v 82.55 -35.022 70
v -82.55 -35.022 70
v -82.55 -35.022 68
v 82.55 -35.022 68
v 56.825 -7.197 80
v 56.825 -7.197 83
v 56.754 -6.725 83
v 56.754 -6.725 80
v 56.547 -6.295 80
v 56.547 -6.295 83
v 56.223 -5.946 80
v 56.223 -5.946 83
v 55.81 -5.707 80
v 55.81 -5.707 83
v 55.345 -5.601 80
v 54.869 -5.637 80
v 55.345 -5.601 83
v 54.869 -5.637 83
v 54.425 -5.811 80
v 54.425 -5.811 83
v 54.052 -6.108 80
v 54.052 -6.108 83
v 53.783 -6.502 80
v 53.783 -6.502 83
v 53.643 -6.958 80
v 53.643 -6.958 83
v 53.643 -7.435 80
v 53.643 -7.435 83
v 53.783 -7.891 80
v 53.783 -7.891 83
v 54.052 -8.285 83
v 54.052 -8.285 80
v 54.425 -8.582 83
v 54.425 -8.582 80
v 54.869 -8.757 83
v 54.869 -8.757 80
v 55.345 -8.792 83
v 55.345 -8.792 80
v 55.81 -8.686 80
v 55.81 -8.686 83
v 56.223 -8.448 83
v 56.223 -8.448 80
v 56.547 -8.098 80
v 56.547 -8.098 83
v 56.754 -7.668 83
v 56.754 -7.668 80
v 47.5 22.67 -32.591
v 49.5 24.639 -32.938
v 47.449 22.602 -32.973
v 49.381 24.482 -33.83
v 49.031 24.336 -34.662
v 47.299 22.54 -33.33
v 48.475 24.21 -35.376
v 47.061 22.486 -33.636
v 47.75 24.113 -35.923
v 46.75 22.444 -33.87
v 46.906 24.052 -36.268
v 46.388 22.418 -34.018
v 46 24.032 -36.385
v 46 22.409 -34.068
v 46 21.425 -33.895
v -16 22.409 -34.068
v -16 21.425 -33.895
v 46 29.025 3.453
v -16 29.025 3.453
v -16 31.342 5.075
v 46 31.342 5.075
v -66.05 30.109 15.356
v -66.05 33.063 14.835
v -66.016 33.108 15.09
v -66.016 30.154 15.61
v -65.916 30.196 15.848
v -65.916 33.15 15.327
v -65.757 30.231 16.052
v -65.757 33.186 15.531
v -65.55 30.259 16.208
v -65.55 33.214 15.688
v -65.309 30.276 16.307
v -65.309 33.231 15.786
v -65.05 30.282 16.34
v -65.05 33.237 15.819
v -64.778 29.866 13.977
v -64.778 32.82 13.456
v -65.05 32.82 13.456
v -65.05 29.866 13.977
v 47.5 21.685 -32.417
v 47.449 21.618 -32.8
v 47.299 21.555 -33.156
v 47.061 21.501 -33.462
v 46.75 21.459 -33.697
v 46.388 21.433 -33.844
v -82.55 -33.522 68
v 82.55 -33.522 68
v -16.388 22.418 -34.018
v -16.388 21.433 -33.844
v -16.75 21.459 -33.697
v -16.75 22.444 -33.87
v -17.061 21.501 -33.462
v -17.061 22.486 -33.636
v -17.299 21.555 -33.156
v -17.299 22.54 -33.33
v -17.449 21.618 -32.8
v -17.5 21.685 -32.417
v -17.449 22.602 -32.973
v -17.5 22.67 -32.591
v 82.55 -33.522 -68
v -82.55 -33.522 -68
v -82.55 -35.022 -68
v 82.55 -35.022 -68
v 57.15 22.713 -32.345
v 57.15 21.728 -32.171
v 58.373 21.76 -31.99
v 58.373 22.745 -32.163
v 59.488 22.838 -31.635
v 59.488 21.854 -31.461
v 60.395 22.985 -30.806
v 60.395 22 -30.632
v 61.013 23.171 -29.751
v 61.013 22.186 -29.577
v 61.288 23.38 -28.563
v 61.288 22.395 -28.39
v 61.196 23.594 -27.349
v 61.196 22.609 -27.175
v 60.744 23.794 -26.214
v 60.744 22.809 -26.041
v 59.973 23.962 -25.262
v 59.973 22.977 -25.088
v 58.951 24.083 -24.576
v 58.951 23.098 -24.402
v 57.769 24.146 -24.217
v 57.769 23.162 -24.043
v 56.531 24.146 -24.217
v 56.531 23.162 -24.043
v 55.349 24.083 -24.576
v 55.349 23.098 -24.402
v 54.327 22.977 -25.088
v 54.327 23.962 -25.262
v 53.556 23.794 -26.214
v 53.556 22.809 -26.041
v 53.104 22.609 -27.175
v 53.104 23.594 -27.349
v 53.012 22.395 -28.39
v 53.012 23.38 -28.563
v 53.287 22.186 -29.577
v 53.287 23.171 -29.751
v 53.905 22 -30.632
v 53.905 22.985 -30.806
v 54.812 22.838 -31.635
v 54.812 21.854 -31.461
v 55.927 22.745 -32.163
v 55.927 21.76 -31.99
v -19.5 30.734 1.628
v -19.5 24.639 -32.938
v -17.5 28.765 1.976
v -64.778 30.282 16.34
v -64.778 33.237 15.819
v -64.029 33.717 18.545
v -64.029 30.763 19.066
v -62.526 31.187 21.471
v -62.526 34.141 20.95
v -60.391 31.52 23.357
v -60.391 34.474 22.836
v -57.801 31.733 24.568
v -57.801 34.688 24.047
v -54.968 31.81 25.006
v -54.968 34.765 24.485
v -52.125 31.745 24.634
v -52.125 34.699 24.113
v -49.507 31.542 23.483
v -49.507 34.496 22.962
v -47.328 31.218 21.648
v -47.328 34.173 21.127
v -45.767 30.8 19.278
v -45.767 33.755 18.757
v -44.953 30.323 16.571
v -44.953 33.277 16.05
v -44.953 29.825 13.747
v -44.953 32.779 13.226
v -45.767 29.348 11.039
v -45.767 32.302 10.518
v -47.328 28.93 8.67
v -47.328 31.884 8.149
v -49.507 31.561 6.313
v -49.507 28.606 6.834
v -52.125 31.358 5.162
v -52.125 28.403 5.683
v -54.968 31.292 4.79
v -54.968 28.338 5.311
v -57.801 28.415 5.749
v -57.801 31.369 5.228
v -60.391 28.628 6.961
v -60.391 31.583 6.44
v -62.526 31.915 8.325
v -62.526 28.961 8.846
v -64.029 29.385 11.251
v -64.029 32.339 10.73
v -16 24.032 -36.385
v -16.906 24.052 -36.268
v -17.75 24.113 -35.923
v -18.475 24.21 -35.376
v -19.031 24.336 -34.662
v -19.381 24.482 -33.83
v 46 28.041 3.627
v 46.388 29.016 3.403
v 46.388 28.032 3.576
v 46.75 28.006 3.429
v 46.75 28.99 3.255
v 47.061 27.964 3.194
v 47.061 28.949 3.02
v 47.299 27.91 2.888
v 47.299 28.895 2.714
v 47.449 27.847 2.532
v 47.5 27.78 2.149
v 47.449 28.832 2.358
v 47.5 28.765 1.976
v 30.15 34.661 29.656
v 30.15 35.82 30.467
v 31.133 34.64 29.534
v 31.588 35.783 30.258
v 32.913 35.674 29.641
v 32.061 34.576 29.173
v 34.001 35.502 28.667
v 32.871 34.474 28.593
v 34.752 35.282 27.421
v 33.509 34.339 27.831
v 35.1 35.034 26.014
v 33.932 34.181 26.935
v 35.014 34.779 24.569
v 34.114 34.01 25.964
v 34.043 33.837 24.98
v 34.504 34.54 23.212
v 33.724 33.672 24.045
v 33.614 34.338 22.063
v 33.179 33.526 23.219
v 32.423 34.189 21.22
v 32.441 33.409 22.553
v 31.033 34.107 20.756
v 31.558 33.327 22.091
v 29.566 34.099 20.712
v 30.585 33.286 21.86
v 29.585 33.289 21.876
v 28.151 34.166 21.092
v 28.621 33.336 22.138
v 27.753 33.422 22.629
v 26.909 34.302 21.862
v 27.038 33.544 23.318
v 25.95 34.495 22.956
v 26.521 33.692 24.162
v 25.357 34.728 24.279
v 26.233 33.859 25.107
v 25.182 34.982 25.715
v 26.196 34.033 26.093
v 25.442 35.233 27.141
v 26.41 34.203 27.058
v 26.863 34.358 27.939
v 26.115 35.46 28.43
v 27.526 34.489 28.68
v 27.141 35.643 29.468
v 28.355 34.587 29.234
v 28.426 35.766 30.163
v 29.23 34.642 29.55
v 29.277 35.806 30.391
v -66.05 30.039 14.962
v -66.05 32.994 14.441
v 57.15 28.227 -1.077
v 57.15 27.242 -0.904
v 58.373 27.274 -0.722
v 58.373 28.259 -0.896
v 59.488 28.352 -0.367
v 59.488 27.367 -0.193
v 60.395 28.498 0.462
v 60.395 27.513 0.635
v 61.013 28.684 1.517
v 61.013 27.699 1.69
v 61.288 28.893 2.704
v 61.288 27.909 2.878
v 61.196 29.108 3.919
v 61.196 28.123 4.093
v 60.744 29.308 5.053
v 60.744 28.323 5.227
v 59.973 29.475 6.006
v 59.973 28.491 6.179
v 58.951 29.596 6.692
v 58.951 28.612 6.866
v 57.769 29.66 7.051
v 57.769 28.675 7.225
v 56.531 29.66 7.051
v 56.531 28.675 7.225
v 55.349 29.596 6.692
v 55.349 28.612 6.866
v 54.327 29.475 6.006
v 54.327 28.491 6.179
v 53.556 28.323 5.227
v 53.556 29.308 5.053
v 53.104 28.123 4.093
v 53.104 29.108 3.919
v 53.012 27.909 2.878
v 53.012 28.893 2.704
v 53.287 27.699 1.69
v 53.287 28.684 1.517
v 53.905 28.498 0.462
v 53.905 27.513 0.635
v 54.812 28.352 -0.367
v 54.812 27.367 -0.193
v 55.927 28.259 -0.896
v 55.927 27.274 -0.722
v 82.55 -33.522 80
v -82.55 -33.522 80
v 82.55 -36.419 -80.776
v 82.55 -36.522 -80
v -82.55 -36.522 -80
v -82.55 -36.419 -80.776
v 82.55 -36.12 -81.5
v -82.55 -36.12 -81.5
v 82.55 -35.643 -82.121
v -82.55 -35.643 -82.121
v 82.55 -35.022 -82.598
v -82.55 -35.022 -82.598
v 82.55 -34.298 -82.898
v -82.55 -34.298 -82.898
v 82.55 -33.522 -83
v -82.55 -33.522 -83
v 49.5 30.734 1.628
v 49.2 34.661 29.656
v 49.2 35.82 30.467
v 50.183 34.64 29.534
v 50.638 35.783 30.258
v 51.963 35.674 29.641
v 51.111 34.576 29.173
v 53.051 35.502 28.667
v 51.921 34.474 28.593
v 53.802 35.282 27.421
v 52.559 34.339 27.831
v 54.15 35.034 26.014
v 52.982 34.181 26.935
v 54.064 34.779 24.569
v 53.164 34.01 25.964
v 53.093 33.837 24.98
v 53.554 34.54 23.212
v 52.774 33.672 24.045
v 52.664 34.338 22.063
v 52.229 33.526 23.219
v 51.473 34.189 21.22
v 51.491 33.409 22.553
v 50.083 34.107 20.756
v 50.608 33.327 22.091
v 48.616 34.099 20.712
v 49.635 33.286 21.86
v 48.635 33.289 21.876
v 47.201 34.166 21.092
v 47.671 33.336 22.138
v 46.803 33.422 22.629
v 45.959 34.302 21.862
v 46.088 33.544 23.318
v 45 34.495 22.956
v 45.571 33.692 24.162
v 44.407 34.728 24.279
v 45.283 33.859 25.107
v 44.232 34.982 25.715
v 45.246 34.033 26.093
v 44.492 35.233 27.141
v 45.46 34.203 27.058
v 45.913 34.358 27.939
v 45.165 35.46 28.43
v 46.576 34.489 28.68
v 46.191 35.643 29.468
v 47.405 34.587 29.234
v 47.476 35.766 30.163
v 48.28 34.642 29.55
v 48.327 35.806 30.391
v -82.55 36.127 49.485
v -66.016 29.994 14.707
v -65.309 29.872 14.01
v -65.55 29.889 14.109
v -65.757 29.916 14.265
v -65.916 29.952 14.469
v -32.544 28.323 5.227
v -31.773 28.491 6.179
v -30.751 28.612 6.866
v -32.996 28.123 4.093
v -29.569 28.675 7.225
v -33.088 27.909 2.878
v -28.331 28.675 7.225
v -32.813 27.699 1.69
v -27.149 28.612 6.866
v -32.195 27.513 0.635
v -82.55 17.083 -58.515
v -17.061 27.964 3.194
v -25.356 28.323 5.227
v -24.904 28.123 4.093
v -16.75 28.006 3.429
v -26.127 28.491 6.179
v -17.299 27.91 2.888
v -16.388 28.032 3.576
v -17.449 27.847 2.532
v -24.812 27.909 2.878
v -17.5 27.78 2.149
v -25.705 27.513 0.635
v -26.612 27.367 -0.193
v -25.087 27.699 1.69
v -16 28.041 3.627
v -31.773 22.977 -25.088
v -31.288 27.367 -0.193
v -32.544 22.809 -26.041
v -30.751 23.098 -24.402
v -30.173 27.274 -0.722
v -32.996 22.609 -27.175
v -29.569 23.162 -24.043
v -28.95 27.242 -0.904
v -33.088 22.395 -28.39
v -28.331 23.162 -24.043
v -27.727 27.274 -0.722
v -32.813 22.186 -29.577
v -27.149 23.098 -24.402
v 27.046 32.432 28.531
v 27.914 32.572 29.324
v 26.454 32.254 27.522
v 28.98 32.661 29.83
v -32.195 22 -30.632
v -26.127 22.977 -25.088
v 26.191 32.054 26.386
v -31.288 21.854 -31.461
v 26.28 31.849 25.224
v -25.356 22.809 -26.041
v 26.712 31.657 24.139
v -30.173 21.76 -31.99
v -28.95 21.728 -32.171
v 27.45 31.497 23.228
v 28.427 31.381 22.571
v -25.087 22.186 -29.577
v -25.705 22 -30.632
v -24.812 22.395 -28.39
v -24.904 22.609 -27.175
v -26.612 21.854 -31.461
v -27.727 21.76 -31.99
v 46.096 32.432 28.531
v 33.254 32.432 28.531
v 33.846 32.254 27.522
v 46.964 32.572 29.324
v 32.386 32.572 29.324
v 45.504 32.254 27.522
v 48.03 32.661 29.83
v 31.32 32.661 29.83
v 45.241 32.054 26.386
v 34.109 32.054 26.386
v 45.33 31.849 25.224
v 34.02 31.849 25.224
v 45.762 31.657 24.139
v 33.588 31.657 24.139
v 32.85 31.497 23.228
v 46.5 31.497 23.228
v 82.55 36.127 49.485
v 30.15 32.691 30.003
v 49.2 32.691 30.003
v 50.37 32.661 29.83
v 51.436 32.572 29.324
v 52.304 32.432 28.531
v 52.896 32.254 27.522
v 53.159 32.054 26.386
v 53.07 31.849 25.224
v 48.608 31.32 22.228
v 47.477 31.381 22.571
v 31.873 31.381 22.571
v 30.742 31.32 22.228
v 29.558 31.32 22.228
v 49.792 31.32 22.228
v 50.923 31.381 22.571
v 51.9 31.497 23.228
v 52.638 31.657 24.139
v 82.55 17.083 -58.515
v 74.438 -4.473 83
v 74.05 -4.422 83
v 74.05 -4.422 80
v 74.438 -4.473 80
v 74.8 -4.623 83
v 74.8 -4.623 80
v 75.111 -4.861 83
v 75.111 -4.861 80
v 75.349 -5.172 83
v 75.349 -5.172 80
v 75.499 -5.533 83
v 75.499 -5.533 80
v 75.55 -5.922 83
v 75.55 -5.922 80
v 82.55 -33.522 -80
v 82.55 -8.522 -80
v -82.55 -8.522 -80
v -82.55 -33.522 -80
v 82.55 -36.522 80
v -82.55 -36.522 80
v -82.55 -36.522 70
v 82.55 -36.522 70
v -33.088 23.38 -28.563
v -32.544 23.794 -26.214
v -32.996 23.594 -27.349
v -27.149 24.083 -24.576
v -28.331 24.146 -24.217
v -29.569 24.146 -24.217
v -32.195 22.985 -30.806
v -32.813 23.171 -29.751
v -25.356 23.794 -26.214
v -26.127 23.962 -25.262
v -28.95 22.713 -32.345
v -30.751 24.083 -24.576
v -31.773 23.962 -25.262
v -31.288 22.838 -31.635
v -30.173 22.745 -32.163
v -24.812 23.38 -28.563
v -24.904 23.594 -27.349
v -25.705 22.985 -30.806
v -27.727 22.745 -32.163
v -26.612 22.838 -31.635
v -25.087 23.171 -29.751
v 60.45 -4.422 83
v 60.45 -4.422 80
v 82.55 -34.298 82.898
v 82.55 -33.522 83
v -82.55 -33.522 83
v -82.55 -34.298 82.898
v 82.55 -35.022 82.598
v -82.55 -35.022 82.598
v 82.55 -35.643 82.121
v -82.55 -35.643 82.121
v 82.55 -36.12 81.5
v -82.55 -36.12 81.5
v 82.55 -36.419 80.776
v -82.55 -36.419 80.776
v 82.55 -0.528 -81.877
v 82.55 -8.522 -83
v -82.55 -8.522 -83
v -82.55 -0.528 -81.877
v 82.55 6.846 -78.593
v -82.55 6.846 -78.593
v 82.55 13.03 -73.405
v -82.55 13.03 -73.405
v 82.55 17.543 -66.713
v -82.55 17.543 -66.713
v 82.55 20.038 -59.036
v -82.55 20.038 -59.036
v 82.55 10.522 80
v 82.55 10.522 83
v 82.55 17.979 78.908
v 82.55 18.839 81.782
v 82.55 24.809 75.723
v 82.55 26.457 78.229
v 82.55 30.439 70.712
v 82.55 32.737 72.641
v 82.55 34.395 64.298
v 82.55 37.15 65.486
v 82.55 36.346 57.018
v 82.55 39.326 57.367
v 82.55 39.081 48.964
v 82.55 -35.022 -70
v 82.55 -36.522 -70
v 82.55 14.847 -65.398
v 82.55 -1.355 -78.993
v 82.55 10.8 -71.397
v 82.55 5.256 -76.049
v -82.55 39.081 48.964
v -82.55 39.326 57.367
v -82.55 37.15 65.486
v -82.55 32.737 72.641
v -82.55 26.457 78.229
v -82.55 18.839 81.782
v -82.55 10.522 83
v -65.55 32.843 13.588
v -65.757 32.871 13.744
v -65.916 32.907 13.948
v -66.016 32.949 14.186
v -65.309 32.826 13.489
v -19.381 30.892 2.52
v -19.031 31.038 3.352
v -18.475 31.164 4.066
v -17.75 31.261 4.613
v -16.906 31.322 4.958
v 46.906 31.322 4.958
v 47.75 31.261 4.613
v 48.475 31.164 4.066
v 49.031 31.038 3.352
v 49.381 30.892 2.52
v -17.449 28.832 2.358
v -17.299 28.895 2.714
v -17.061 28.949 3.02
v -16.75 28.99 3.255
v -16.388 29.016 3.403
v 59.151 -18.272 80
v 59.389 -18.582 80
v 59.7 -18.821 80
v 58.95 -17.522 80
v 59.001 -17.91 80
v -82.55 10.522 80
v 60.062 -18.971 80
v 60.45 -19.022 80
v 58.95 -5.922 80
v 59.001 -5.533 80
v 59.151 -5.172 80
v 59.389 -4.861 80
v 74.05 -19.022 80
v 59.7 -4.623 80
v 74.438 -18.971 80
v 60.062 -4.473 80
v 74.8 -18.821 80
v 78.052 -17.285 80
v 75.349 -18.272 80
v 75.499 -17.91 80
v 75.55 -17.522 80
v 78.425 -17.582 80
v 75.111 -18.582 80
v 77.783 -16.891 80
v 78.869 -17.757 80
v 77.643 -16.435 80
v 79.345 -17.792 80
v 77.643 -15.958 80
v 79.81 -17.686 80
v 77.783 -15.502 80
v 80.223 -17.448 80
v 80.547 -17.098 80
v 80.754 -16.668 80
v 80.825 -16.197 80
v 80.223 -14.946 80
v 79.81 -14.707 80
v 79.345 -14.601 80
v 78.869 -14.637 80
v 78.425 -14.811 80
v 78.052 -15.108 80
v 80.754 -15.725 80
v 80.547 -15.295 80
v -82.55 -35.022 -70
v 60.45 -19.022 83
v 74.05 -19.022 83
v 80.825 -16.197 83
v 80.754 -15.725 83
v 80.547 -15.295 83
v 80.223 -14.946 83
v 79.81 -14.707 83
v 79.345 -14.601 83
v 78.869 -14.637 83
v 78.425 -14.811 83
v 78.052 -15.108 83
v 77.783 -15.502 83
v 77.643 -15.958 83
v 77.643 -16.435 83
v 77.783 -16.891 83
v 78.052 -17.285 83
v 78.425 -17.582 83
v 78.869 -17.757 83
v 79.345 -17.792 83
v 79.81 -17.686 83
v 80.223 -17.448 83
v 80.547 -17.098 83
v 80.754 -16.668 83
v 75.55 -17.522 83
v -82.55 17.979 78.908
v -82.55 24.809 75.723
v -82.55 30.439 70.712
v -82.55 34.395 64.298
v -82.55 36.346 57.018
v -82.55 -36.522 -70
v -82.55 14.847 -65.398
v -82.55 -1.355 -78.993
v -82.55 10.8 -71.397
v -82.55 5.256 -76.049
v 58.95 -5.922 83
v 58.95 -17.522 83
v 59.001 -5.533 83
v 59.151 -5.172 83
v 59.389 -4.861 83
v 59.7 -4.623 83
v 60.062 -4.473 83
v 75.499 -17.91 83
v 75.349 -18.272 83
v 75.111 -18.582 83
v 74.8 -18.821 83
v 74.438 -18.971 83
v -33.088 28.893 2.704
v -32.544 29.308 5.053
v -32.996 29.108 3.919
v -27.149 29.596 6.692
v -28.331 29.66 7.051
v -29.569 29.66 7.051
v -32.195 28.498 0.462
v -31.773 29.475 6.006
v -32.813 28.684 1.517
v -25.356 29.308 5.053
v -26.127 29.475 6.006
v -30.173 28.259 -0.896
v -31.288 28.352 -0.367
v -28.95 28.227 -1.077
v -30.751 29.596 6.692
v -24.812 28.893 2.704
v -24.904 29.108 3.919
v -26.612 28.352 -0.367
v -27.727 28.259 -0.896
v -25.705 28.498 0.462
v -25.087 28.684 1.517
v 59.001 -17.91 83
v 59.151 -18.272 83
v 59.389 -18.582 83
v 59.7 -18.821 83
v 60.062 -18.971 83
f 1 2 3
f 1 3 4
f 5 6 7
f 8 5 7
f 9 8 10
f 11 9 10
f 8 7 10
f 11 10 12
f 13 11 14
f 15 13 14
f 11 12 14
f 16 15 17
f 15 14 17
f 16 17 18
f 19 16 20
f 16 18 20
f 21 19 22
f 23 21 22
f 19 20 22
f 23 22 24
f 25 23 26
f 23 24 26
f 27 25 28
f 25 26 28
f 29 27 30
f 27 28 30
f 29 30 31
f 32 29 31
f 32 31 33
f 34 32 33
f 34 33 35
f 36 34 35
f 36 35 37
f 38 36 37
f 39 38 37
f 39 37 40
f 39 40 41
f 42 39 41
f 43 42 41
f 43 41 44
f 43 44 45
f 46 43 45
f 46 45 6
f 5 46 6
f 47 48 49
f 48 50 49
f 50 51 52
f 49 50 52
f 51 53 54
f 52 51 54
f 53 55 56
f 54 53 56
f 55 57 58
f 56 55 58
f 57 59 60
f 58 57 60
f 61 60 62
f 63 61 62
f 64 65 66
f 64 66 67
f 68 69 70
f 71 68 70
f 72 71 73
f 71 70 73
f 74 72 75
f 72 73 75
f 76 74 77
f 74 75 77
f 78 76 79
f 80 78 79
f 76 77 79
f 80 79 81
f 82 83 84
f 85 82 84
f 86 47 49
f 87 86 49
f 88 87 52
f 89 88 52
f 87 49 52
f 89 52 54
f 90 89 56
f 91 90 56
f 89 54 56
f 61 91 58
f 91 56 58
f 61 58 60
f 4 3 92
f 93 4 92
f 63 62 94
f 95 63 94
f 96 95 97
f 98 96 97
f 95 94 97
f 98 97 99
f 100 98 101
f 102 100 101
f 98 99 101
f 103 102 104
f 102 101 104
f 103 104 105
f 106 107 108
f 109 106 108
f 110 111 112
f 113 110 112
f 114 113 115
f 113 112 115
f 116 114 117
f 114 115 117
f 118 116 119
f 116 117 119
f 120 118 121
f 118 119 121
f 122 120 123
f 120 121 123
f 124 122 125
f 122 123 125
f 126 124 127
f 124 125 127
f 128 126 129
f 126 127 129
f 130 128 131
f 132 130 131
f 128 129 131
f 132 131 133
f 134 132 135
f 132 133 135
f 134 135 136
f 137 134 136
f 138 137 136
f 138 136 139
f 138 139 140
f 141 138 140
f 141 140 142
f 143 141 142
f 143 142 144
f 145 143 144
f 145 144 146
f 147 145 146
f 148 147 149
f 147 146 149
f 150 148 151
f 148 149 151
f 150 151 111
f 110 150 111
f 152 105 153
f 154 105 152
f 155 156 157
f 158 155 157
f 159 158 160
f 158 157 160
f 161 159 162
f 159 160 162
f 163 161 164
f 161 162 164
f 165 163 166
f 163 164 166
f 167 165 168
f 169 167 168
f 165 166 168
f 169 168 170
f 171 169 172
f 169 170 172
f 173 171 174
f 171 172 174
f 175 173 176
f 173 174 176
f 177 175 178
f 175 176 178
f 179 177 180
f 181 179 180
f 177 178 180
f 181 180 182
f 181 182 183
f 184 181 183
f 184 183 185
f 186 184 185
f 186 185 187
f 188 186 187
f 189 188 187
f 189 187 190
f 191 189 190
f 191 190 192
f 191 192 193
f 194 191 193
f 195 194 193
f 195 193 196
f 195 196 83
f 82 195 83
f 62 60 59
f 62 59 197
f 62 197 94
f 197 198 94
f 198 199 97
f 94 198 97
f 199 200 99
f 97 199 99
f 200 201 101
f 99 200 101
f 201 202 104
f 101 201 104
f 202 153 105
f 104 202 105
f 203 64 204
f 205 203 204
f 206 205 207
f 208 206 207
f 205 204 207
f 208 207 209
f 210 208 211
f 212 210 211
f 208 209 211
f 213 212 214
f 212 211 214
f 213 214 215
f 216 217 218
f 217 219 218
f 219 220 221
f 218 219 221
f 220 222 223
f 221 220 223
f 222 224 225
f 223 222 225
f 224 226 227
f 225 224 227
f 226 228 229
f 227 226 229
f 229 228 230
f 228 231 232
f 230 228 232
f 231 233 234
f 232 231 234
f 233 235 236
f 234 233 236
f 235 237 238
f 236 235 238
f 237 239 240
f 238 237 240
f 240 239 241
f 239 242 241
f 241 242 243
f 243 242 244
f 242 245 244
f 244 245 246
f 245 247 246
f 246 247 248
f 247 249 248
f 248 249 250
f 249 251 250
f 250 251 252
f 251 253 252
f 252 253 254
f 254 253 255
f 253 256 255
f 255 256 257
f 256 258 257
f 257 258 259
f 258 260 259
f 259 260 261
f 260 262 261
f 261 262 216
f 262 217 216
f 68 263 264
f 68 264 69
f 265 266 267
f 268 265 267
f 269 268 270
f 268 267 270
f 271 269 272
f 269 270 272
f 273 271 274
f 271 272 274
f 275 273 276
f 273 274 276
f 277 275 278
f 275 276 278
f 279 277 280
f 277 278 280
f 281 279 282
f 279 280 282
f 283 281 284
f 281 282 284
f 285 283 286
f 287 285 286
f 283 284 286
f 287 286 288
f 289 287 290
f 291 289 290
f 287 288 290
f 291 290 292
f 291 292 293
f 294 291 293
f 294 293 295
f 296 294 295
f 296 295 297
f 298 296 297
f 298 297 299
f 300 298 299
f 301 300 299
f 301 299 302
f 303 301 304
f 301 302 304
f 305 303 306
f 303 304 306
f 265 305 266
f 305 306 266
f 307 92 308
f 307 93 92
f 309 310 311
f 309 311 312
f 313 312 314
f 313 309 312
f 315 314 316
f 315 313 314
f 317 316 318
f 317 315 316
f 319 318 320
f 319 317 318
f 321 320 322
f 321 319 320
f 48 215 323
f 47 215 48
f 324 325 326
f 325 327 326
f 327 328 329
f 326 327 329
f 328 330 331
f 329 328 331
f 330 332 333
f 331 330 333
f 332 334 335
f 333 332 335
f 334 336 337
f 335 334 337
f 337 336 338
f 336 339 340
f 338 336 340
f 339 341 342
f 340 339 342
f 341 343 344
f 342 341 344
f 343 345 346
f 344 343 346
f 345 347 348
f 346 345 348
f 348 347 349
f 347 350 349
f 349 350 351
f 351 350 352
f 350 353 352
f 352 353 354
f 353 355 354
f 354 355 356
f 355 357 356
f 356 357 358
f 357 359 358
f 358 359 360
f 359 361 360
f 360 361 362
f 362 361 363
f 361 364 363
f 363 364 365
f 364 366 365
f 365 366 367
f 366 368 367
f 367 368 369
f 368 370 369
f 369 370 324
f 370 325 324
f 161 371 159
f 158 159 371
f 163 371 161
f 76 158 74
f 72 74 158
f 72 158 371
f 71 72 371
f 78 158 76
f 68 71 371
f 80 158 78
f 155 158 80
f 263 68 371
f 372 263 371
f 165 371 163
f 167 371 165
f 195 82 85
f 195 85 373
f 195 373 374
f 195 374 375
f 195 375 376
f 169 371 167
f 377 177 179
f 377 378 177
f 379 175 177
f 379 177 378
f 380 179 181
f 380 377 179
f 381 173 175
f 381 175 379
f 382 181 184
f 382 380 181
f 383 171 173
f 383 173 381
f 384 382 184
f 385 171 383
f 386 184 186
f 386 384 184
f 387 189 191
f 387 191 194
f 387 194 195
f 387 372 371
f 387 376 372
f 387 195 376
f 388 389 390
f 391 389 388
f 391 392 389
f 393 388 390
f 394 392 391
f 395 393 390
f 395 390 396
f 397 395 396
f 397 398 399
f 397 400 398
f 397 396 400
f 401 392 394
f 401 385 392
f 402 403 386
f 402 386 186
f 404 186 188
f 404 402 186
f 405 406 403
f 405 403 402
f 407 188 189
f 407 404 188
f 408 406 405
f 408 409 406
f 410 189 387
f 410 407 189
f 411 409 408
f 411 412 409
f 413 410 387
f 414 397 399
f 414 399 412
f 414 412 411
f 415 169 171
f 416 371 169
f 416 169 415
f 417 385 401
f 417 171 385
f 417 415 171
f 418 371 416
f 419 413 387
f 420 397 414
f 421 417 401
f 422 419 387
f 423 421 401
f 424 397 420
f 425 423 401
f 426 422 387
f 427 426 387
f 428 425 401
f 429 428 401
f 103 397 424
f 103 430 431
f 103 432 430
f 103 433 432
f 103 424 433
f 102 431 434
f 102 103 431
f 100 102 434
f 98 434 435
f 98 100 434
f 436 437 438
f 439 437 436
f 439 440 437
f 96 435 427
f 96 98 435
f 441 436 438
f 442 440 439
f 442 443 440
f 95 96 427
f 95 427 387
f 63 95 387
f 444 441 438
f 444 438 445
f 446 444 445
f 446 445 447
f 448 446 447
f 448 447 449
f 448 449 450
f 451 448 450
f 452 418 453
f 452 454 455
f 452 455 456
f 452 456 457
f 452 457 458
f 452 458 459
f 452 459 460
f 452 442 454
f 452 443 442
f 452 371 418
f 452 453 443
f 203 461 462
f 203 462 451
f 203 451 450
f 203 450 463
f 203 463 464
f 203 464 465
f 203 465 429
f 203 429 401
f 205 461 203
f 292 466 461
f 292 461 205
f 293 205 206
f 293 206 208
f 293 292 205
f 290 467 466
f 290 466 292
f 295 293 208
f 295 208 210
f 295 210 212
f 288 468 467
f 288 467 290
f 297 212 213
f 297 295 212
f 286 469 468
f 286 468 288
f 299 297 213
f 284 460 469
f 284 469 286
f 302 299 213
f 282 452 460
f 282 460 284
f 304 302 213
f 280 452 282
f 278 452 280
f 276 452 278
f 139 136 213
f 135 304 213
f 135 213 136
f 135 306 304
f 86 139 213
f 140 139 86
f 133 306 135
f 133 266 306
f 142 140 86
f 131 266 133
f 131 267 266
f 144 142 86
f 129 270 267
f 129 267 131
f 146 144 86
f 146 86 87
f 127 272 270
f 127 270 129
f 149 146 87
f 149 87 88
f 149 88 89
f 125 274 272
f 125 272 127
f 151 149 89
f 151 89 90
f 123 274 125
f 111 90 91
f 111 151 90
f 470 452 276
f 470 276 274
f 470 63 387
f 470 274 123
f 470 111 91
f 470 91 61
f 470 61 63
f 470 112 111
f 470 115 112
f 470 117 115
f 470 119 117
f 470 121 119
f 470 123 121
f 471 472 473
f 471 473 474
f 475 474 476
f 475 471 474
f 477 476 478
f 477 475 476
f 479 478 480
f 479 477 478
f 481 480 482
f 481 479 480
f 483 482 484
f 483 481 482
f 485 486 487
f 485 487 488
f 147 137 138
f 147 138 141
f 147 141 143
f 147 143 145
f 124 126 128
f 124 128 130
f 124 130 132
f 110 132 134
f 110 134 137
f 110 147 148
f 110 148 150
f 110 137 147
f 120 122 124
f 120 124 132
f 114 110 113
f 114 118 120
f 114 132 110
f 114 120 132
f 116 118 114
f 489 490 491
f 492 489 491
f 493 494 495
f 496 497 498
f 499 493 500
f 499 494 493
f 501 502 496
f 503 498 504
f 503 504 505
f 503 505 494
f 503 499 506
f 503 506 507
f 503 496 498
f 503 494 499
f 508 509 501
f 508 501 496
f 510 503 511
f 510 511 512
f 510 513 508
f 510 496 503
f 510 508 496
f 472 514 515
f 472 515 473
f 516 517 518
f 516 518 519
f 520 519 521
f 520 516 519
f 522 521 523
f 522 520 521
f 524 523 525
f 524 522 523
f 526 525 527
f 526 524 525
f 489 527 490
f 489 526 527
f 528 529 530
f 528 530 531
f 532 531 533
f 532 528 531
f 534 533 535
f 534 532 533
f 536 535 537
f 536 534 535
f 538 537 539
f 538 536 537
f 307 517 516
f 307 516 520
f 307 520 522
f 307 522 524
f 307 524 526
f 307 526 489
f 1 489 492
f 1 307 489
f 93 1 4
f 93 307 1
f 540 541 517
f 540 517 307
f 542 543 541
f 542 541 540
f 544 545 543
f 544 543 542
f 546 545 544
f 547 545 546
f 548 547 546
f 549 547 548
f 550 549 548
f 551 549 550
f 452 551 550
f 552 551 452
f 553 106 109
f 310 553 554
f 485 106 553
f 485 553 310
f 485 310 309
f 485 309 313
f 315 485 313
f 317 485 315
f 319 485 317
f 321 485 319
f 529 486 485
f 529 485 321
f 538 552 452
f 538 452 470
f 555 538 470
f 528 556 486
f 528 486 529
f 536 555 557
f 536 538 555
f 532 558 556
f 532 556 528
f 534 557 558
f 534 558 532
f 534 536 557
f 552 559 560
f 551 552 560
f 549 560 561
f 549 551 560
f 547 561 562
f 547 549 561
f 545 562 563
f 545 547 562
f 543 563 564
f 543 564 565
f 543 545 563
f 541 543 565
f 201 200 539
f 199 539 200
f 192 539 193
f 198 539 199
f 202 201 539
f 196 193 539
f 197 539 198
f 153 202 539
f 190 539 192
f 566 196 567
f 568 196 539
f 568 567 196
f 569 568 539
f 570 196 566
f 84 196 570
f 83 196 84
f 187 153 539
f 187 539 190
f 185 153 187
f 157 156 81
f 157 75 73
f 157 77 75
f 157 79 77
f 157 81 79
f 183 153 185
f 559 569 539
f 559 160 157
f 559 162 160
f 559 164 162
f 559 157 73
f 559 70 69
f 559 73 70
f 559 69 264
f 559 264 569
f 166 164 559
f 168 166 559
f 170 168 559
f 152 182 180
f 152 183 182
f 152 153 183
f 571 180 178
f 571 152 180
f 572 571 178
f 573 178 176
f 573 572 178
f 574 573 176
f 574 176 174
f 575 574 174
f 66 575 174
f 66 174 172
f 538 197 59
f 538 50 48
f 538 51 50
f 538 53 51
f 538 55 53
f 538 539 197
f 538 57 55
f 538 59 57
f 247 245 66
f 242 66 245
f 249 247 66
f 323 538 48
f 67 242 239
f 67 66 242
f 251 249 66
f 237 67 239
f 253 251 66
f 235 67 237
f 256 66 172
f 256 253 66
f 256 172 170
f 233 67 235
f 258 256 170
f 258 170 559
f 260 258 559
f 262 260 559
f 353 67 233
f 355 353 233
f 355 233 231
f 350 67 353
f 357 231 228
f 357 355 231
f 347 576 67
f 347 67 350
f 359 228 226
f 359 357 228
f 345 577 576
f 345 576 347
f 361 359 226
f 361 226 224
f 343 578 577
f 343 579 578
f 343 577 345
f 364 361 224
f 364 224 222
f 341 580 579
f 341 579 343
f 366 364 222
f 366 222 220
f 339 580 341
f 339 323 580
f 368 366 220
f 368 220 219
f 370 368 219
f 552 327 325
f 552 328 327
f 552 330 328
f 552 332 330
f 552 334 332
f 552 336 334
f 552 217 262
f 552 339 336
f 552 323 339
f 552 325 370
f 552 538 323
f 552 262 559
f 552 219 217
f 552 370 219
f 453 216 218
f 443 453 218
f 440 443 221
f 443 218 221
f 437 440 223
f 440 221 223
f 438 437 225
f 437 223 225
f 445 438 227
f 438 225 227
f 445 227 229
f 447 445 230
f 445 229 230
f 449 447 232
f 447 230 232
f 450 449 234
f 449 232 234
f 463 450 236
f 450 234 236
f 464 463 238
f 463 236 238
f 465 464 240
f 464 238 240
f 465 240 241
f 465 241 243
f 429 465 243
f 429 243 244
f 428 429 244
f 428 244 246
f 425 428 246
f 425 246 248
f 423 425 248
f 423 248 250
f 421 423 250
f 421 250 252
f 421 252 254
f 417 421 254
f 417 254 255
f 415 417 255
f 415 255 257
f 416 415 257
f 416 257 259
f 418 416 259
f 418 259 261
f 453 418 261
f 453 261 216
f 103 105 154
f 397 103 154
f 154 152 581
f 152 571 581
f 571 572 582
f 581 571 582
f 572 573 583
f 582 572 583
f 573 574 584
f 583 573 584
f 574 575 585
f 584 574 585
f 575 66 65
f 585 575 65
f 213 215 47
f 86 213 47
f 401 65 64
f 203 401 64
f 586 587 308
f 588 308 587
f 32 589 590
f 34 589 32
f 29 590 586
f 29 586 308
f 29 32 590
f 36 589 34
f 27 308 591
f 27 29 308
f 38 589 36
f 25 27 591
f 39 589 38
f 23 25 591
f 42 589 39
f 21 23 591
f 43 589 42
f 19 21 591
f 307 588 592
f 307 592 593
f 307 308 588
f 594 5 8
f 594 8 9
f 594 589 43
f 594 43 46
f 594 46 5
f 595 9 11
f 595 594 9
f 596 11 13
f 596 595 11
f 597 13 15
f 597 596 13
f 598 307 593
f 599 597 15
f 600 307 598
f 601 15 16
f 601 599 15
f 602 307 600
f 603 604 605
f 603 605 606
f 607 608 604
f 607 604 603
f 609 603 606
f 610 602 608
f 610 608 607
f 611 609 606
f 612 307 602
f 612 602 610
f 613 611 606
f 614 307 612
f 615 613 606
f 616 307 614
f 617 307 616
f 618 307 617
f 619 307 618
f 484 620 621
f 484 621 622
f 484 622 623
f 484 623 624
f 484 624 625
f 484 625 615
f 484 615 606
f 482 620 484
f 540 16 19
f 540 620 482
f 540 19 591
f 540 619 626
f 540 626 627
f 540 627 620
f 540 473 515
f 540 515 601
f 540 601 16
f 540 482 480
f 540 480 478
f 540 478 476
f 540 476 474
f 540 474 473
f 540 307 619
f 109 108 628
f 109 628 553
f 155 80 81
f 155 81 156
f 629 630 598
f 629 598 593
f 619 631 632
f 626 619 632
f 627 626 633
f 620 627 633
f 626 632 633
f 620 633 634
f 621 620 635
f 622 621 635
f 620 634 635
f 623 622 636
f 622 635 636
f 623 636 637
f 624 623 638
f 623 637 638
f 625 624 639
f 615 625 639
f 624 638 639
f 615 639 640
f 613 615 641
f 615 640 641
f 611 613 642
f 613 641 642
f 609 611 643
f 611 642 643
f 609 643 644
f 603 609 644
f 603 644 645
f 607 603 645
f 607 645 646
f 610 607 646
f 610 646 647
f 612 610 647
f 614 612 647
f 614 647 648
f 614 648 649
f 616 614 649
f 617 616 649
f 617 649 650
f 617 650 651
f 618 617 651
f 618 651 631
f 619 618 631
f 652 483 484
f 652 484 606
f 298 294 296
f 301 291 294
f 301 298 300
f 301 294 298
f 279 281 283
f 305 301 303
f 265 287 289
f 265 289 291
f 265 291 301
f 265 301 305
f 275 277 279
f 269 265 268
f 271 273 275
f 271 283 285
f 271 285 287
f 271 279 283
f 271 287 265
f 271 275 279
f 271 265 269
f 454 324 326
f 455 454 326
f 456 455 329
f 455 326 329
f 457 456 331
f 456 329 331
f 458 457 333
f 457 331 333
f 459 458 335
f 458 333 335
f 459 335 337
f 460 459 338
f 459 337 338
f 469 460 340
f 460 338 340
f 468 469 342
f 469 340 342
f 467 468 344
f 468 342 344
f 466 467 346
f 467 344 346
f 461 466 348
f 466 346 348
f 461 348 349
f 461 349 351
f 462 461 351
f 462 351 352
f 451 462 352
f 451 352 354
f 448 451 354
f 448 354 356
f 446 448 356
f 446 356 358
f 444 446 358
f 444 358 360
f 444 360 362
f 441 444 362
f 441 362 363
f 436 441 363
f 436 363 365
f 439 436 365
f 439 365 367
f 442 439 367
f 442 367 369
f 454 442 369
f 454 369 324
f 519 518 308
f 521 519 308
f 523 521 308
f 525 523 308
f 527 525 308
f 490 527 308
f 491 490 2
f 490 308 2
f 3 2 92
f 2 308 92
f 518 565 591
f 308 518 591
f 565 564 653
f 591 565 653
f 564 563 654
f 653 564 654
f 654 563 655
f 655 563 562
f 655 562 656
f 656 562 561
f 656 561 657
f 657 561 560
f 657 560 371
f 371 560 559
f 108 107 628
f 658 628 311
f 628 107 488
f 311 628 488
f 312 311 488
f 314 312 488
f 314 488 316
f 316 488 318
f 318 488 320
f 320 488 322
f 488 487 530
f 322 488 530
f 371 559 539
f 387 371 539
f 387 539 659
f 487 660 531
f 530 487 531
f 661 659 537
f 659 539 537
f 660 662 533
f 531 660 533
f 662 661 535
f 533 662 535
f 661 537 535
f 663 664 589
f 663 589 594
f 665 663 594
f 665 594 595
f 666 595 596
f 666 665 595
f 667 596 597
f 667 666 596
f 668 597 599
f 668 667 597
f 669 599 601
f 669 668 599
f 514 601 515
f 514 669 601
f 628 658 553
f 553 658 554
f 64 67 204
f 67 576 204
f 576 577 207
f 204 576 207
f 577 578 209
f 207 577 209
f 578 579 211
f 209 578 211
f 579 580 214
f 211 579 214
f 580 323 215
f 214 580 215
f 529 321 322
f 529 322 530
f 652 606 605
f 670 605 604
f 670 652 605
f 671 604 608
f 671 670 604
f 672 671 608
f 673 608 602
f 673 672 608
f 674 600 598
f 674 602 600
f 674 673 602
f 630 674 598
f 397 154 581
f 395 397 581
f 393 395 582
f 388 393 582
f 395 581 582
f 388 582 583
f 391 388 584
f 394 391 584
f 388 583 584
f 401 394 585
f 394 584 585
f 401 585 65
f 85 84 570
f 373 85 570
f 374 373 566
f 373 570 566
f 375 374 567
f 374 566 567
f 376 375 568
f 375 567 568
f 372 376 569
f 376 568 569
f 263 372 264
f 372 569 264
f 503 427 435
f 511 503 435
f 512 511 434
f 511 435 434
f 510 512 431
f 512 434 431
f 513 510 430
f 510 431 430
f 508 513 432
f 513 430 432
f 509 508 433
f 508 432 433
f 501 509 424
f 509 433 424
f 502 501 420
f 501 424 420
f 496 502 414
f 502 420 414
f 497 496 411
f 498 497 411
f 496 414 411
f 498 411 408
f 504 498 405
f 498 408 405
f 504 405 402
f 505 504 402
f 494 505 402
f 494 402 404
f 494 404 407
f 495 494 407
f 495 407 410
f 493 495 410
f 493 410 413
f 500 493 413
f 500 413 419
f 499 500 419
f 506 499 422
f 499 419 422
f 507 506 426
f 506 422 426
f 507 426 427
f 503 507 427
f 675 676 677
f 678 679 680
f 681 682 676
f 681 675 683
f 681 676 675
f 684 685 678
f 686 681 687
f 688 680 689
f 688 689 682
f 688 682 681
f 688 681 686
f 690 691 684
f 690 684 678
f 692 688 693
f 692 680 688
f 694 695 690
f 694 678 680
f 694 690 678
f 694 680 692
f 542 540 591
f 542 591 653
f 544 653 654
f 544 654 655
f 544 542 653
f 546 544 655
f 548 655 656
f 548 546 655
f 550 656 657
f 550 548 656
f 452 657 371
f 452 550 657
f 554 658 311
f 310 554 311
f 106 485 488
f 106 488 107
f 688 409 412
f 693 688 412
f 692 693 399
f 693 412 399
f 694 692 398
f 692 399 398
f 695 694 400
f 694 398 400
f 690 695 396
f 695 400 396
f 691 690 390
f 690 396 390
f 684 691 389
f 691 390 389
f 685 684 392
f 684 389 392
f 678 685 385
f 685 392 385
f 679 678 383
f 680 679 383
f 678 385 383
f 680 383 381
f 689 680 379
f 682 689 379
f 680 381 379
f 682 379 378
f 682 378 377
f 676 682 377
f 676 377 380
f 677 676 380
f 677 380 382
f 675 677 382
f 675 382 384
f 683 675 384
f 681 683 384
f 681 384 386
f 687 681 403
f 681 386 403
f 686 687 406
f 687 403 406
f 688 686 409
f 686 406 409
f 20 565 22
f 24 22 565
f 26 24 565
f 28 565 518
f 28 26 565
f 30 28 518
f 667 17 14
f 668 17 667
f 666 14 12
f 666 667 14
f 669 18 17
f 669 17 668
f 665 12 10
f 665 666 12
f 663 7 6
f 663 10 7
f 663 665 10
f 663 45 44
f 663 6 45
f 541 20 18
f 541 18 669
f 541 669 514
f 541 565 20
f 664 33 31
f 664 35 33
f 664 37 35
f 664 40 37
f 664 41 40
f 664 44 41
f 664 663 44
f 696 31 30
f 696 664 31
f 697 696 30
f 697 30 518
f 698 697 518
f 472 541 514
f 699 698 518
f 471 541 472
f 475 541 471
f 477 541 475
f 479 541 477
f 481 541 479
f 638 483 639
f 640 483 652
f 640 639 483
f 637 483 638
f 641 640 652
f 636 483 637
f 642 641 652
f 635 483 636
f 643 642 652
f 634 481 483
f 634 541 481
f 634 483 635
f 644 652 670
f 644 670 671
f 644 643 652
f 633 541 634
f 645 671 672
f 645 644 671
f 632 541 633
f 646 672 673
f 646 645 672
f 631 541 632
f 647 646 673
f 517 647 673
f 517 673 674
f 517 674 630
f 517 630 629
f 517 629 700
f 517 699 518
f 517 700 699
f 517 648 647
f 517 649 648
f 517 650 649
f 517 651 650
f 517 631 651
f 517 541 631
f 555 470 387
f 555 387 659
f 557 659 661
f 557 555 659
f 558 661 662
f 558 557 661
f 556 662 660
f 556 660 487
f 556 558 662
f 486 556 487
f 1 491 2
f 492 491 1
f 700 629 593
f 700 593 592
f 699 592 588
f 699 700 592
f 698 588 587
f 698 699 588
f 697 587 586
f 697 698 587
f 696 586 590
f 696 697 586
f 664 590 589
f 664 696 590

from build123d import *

# Parameters (mm, degrees)
BOSS_EXTRUDE1_DEPTH = 82.55
CUT_EXTRUDE1_REACH  = 139.687
CUT_EXTRUDE2_REACH  = 139.687
SKETCH3_R           = 3.97
SKETCH5_R           = 4.15
CUT_EXTRUDE4_DEPTH  = 1
CUT_EXTRUDE5_REACH  = 191.559
SKETCH6_R           = 1.6
CHAMFER1_SIZE       = 2
CHAMFER2_SIZE       = 1
SKETCH7_W           = 165.1
SKETCH7_H           = 2
CUT_EXTRUDE6_DEPTH  = 1.5


with BuildPart() as part:
    # Sketch1 → Boss-Extrude1 (new, symmetric)
    with BuildSketch(Plane(origin=(0, 0, 0), x_dir=(0, 0, -1), z_dir=(1, 0, 0))):
        with BuildLine():
            Line((-80, -33.521656958), (-80, 10.521656958))
            ThreePointArc((-80, 10.521656958), (-70.712477852, 30.438812479), (-49.485147381, 36.126658537))
            Line((-49.485147381, 36.126658537), (58.514852619, 17.08334462))
            ThreePointArc((58.514852619, 17.08334462), (73.917155521, 8.190820894), (80, -8.521656958))
            Line((80, -8.521656958), (80, -33.521656958))
            Line((80, -33.521656958), (68, -33.521656958))
            Line((68, -33.521656958), (68, -36.521656958))
            Line((68, -36.521656958), (80, -36.521656958))
            ThreePointArc((80, -36.521656958), (82.121320344, -35.642977302), (83, -33.521656958))
            Line((83, -33.521656958), (83, -8.521656958))
            ThreePointArc((83, -8.521656958), (76.21528885, 10.119183723), (59.035797152, 20.037767879))
            Line((59.035797152, 20.037767879), (-48.964202848, 39.081081796))
            ThreePointArc((-48.964202848, 39.081081796), (-72.640840681, 32.736945809), (-83, 10.521656958))
            Line((-83, 10.521656958), (-83, -33.521656958))
            ThreePointArc((-83, -33.521656958), (-82.121320344, -35.642977302), (-80, -36.521656958))
            Line((-80, -36.521656958), (-68, -36.521656958))
            Line((-68, -36.521656958), (-68, -33.521656958))
            Line((-68, -33.521656958), (-80, -33.521656958))
        make_face()
    extrude(amount=BOSS_EXTRUDE1_DEPTH, both=True)

    # Sketch2 → Cut-Extrude1 (cut, up to next)
    with BuildSketch(Plane(origin=(0, 29.529271148, -5.206807224), x_dir=(1, 0, 0), z_dir=(0, 0.984807753012209, -0.1736481776669248)), mode=Mode.PRIVATE) as cut_extrude1_sk1:
        with BuildLine():
            Line((-16, -8.440611136), (46, -8.440611136))
            ThreePointArc((46, -8.440611136), (47.060660172, -8.001271308), (47.5, -6.940611136))
            Line((47.5, -6.940611136), (47.5, 28.159388864))
            ThreePointArc((47.5, 28.159388864), (47.060660172, 29.220049036), (46, 29.659388864))
            Line((46, 29.659388864), (-16, 29.659388864))
            ThreePointArc((-16, 29.659388864), (-17.060660172, 29.220049036), (-17.5, 28.159388864))
            Line((-17.5, 28.159388864), (-17.5, -6.940611136))
            ThreePointArc((-17.5, -6.940611136), (-17.060660172, -8.001271308), (-16, -8.440611136))
        make_face()
    cut_extrude1_tool1 = extrude(cut_extrude1_sk1.sketch, amount=-CUT_EXTRUDE1_REACH, mode=Mode.PRIVATE) & part.part
    add(cut_extrude1_tool1.solids().sort_by_distance((15, 27.68697, -15.655016))[0], mode=Mode.SUBTRACT)

    # Sketch3 → Cut-Extrude2 (cut, up to next)
    with BuildSketch(Plane(origin=(0, 29.529271148, -5.206807224), x_dir=(1, 0, 0), z_dir=(0, 0.984807753012209, -0.1736481776669248)), mode=Mode.PRIVATE) as cut_extrude2_sk1:
        with Locations(Location((49.2, -31.254272732, 0), (0, 0, 270))):
            Circle(SKETCH3_R)
    cut_extrude2_tool1 = extrude(cut_extrude2_sk1.sketch, amount=-CUT_EXTRUDE2_REACH, mode=Mode.PRIVATE) & part.part
    # Sketch3 → Cut-Extrude2 (cut, up to next)
    with BuildSketch(Plane(origin=(0, 29.529271148, -5.206807224), x_dir=(1, 0, 0), z_dir=(0, 0.984807753012209, -0.1736481776669248)), mode=Mode.PRIVATE) as cut_extrude2_sk2:
        with Locations(Location((30.15, -31.254272732, 0), (0, 0, 270))):
            Circle(SKETCH3_R)
    cut_extrude2_tool2 = extrude(cut_extrude2_sk2.sketch, amount=-CUT_EXTRUDE2_REACH, mode=Mode.PRIVATE) & part.part
    # Sketch3 → Cut-Extrude2 (cut, up to next)
    with BuildSketch(Plane(origin=(0, 29.529271148, -5.206807224), x_dir=(1, 0, 0), z_dir=(0, 0.984807753012209, -0.1736481776669248)), mode=Mode.PRIVATE) as cut_extrude2_sk3:
        with BuildLine():
            Line((-64.777738917, -18.950611136), (-65.05, -18.950611136))
            ThreePointArc((-65.05, -18.950611136), (-65.757106781, -19.243504355), (-66.05, -19.950611136))
            Line((-66.05, -19.950611136), (-66.05, -20.350611136))
            ThreePointArc((-66.05, -20.350611136), (-65.757106781, -21.057717917), (-65.05, -21.350611136))
            Line((-65.05, -21.350611136), (-64.777738917, -21.350611136))
            ThreePointArc((-64.777738917, -21.350611136), (-44.85, -20.150611136), (-64.777738917, -18.950611136))
        make_face()
    cut_extrude2_tool3 = extrude(cut_extrude2_sk3.sketch, amount=-CUT_EXTRUDE2_REACH, mode=Mode.PRIVATE) & part.part
    add(cut_extrude2_tool1.solids().sort_by_distance((49.2, 34.956519, 25.572643))[0], mode=Mode.SUBTRACT)
    add(cut_extrude2_tool2.solids().sort_by_distance((30.15, 34.956519, 25.572643))[0], mode=Mode.SUBTRACT)
    add(cut_extrude2_tool3.solids().sort_by_distance((-54.933345, 33.028388, 14.637671))[0], mode=Mode.SUBTRACT)

    # Sketch5 → Cut-Extrude4 (cut)
    with BuildSketch(Plane(origin=(0, 26.574847889, -4.685862691), x_dir=(1, 0, 0), z_dir=(0, -0.984807753012209, 0.1736481776669249))):
        with Locations(Location((57.15, -23.759388864, 0), (0, 0, 270))):
            Circle(SKETCH5_R)
        with Locations(Location((-28.95, -23.759388864, 0), (0, 0, 270))):
            Circle(SKETCH5_R)
        with Locations(Location((-28.95, 7.990611136, 0), (0, 0, 270))):
            Circle(SKETCH5_R)
        with Locations(Location((57.15, 7.990611136, 0), (0, 0, 270))):
            Circle(SKETCH5_R)
    extrude(amount=-CUT_EXTRUDE4_DEPTH, mode=Mode.SUBTRACT)

    # Sketch6 → Cut-Extrude5 (cut, up to next)
    with BuildSketch(Plane.XY.offset(83), mode=Mode.PRIVATE) as cut_extrude5_sk1:
        with Locations((79.225, -16.196656958)):
            Circle(SKETCH6_R)
    cut_extrude5_tool1 = extrude(cut_extrude5_sk1.sketch, amount=-CUT_EXTRUDE5_REACH, mode=Mode.PRIVATE) & part.part
    # Sketch6 → Cut-Extrude5 (cut, up to next)
    with BuildSketch(Plane.XY.offset(83), mode=Mode.PRIVATE) as cut_extrude5_sk2:
        with Locations((55.225, -7.196656958)):
            Circle(SKETCH6_R)
    cut_extrude5_tool2 = extrude(cut_extrude5_sk2.sketch, amount=-CUT_EXTRUDE5_REACH, mode=Mode.PRIVATE) & part.part
    # Sketch6 → Cut-Extrude5 (cut, up to next)
    with BuildSketch(Plane.XY.offset(83), mode=Mode.PRIVATE) as cut_extrude5_sk3:
        with BuildLine():
            Line((60.45, -4.421656958), (74.05, -4.421656958))
            ThreePointArc((74.05, -4.421656958), (75.110660172, -4.860996786), (75.55, -5.921656958))
            Line((75.55, -5.921656958), (75.55, -17.521656958))
            ThreePointArc((75.55, -17.521656958), (75.110660172, -18.58231713), (74.05, -19.021656958))
            Line((74.05, -19.021656958), (60.45, -19.021656958))
            ThreePointArc((60.45, -19.021656958), (59.389339828, -18.58231713), (58.95, -17.521656958))
            Line((58.95, -17.521656958), (58.95, -5.921656958))
            ThreePointArc((58.95, -5.921656958), (59.389339828, -4.860996786), (60.45, -4.421656958))
        make_face()
    cut_extrude5_tool3 = extrude(cut_extrude5_sk3.sketch, amount=-CUT_EXTRUDE5_REACH, mode=Mode.PRIVATE) & part.part
    add(cut_extrude5_tool1.solids().sort_by_distance((79.225, -16.196657, 83))[0], mode=Mode.SUBTRACT)
    add(cut_extrude5_tool2.solids().sort_by_distance((55.225, -7.196657, 83))[0], mode=Mode.SUBTRACT)
    add(cut_extrude5_tool3.solids().sort_by_distance((67.25, -11.721657, 83))[0], mode=Mode.SUBTRACT)

    # Chamfer1
    chamfer1_edges = [part.edges().sort_by_distance(p)[0] for p in [
        (47.060660172, 24.455262881, -33.982938058),
        (15, 24.378972321, -34.415603327),
        (-17.060660172, 24.455262881, -33.982938058),
        (-17.5, 27.686970105, -15.655015632),
        (-17.060660172, 30.918677329, 2.672906794),
        (15, 30.99496789, 3.105572063),
        (47.060660172, 30.918677329, 2.672906794),
        (47.5, 27.686970105, -15.655015632),
    ]]
    chamfer(chamfer1_edges, length=CHAMFER1_SIZE)

    # Chamfer2
    chamfer2_edges = [part.edges().sort_by_distance(p)[0] for p in [
        (49.2, 34.267135387, 21.662956098),
        (30.15, 34.267135387, 21.662956098),
    ]]
    chamfer(chamfer2_edges, length=CHAMFER2_SIZE)

    # Sketch7 → Cut-Extrude6 (cut)
    with BuildSketch(Plane.XZ.offset(36.521656958)):
        with Locations((0, 69)):
            Rectangle(SKETCH7_W, SKETCH7_H)
        with Locations((0, -69)):
            Rectangle(SKETCH7_W, SKETCH7_H)
    extrude(amount=-CUT_EXTRUDE6_DEPTH, mode=Mode.SUBTRACT)


solid = part.part
